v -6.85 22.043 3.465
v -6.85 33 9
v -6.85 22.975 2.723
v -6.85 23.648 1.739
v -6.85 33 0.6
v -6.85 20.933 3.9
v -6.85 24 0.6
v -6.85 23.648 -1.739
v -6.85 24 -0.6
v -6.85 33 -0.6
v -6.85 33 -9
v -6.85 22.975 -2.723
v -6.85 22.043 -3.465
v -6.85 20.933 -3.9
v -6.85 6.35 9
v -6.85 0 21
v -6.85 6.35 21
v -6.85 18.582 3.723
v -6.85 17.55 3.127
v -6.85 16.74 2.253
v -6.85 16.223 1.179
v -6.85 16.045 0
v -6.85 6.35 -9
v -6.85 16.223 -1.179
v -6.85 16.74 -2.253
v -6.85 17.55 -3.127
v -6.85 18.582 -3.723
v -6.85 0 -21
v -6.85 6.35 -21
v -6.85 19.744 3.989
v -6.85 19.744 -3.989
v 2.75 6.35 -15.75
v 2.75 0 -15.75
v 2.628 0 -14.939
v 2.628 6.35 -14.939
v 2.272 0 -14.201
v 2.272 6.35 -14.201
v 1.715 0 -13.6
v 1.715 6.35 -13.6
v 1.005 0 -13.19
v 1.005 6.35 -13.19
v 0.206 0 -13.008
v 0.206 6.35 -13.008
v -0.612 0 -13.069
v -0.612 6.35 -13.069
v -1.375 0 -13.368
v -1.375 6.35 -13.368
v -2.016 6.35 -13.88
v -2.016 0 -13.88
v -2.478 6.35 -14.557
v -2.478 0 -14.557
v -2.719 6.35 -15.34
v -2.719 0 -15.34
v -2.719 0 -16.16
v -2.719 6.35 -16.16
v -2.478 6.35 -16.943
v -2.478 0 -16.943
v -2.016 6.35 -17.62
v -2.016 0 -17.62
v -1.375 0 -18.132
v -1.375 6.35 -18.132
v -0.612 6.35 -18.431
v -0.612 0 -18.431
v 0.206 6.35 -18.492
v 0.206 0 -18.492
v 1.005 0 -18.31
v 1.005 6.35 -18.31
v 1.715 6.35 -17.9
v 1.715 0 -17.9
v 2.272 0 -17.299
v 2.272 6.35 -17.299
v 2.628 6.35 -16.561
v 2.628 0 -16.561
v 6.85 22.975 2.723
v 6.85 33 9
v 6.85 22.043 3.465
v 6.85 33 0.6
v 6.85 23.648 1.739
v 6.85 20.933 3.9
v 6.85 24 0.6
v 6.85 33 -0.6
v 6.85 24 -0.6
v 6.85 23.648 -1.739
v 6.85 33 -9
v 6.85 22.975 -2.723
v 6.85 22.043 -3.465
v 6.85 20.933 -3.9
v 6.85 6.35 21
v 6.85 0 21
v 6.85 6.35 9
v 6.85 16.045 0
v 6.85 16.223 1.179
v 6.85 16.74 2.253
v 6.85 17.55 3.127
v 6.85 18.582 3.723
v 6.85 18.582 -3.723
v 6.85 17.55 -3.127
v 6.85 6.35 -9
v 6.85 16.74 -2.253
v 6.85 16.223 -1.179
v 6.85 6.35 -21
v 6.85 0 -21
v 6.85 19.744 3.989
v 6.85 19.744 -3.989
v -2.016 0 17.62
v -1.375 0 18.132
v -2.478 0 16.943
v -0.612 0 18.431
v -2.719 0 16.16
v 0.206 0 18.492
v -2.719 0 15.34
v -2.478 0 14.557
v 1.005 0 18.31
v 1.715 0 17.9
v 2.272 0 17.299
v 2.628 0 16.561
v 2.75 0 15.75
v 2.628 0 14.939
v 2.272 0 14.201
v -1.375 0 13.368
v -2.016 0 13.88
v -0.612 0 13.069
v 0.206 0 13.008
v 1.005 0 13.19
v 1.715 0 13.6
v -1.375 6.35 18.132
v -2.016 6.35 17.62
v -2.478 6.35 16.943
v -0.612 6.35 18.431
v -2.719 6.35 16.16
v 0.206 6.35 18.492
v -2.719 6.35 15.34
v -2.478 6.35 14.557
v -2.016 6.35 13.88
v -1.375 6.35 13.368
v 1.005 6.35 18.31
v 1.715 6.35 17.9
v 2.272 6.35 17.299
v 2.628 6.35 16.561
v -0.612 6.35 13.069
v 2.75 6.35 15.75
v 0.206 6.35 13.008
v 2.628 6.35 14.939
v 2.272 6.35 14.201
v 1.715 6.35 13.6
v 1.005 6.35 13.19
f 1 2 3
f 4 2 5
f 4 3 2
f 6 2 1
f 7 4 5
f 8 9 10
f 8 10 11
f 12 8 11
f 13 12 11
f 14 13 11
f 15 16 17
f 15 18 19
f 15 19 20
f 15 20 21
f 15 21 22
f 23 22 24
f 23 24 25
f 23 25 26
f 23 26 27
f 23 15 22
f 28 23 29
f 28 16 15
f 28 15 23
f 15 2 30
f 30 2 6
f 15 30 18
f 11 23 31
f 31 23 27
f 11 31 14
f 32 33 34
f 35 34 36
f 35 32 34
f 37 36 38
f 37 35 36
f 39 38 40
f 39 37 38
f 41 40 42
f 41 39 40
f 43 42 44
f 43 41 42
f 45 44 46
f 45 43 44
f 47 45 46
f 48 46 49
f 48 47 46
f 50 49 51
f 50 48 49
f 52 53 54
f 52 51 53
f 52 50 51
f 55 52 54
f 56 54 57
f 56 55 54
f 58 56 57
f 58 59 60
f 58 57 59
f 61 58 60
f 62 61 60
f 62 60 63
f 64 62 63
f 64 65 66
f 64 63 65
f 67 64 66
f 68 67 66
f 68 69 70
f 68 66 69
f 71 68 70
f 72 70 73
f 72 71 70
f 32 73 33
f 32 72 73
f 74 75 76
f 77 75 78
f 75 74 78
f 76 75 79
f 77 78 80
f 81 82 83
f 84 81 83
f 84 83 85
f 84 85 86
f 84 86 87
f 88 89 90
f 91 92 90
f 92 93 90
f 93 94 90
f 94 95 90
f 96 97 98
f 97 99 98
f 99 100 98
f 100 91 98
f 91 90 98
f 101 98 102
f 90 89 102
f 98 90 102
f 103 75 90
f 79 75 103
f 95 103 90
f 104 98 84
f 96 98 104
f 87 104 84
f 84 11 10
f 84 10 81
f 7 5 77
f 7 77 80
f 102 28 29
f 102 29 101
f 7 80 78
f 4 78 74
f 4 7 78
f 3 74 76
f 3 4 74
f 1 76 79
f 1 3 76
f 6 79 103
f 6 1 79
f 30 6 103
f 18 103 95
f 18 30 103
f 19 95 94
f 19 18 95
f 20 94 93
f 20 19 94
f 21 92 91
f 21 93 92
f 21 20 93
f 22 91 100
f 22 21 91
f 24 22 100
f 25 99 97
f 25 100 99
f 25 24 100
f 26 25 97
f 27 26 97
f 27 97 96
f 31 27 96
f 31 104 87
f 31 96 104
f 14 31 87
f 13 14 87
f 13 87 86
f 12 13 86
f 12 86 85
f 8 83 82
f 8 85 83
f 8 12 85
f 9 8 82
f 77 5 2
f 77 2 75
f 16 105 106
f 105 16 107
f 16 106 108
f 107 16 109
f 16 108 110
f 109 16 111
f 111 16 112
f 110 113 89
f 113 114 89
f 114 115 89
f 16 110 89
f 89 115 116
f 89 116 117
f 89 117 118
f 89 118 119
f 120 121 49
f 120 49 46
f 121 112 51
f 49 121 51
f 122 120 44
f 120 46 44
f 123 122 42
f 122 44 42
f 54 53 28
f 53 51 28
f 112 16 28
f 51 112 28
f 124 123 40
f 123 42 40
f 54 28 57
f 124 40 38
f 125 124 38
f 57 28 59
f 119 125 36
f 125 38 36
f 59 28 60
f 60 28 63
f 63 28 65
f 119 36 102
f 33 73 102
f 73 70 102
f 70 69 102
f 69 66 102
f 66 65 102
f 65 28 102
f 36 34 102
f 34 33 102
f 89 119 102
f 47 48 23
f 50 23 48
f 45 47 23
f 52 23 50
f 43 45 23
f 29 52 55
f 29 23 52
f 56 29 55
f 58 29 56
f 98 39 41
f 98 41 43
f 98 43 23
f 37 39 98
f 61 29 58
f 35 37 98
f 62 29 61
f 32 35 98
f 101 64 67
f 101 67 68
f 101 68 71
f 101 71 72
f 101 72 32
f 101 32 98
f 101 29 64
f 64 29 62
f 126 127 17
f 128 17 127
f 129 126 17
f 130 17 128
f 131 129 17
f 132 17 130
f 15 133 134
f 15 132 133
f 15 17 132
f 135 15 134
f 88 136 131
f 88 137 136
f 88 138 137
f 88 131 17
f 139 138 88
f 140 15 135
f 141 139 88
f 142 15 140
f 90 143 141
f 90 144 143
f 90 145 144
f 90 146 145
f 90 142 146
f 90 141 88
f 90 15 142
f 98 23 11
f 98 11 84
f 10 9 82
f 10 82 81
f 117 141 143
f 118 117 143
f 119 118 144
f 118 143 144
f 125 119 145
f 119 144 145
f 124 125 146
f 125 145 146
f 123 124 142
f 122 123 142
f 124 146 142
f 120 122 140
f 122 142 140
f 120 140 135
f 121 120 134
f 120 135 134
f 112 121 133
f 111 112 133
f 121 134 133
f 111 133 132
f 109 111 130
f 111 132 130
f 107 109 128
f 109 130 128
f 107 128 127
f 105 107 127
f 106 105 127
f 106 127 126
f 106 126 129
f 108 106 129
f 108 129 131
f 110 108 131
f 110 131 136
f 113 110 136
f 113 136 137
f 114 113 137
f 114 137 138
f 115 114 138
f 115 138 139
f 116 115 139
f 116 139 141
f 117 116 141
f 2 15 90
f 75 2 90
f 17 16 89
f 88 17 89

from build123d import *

# Parameters (mm, degrees)
SKETCH1_W           = 13.7
SKETCH1_H           = 42
BOSS_EXTRUDE1_DEPTH = 6.35
SKETCH2_W           = 13.7
SKETCH2_H           = 18
BOSS_EXTRUDE2_DEPTH = 26.65
CUT_EXTRUDE1_DEPTH  = 14.7
SKETCH4_R           = 2.75
CUT_EXTRUDE2_DEPTH  = 7.35


with BuildPart() as part:
    # Sketch1 → Boss-Extrude1 (new body)
    with BuildSketch(Plane(origin=(0, 0, 0), x_dir=(1, 0, 0), z_dir=(0, 1, 0))):
        Rectangle(SKETCH1_W, SKETCH1_H)
    extrude(amount=BOSS_EXTRUDE1_DEPTH)

    # Sketch2 → Boss-Extrude2 (add)
    with BuildSketch(Plane(origin=(0, 6.35, 0), x_dir=(1, 0, 0), z_dir=(0, 1, 0))):
        Rectangle(SKETCH2_W, SKETCH2_H)
    extrude(amount=BOSS_EXTRUDE2_DEPTH)

    # Sketch3 → Cut-Extrude1 (cut, through all)
    with BuildSketch(Plane.ZY.offset(6.85)):
        with BuildLine():
            Line((-0.6, 24), (-0.6, 33))
            Line((-0.6, 33), (0.6, 33))
            Line((0.6, 33), (0.6, 24))
            ThreePointArc((0.6, 24), (0, 16.045256013), (-0.6, 24))
        make_face()
    extrude(amount=-CUT_EXTRUDE1_DEPTH, mode=Mode.SUBTRACT)

    # Sketch4 → Cut-Extrude2 (cut, through all)
    with BuildSketch(Plane(origin=(0, 6.35, 0), x_dir=(1, 0, 0), z_dir=(0, 1, 0))):
        with Locations((0, -15.75)):
            Circle(SKETCH4_R)
    cut_extrude2 = extrude(amount=-CUT_EXTRUDE2_DEPTH, mode=Mode.SUBTRACT)

    # Mirror1: Cut-Extrude2 across plane
    add(cut_extrude2.mirror(Plane.XY), mode=Mode.SUBTRACT)


solid = part.part
